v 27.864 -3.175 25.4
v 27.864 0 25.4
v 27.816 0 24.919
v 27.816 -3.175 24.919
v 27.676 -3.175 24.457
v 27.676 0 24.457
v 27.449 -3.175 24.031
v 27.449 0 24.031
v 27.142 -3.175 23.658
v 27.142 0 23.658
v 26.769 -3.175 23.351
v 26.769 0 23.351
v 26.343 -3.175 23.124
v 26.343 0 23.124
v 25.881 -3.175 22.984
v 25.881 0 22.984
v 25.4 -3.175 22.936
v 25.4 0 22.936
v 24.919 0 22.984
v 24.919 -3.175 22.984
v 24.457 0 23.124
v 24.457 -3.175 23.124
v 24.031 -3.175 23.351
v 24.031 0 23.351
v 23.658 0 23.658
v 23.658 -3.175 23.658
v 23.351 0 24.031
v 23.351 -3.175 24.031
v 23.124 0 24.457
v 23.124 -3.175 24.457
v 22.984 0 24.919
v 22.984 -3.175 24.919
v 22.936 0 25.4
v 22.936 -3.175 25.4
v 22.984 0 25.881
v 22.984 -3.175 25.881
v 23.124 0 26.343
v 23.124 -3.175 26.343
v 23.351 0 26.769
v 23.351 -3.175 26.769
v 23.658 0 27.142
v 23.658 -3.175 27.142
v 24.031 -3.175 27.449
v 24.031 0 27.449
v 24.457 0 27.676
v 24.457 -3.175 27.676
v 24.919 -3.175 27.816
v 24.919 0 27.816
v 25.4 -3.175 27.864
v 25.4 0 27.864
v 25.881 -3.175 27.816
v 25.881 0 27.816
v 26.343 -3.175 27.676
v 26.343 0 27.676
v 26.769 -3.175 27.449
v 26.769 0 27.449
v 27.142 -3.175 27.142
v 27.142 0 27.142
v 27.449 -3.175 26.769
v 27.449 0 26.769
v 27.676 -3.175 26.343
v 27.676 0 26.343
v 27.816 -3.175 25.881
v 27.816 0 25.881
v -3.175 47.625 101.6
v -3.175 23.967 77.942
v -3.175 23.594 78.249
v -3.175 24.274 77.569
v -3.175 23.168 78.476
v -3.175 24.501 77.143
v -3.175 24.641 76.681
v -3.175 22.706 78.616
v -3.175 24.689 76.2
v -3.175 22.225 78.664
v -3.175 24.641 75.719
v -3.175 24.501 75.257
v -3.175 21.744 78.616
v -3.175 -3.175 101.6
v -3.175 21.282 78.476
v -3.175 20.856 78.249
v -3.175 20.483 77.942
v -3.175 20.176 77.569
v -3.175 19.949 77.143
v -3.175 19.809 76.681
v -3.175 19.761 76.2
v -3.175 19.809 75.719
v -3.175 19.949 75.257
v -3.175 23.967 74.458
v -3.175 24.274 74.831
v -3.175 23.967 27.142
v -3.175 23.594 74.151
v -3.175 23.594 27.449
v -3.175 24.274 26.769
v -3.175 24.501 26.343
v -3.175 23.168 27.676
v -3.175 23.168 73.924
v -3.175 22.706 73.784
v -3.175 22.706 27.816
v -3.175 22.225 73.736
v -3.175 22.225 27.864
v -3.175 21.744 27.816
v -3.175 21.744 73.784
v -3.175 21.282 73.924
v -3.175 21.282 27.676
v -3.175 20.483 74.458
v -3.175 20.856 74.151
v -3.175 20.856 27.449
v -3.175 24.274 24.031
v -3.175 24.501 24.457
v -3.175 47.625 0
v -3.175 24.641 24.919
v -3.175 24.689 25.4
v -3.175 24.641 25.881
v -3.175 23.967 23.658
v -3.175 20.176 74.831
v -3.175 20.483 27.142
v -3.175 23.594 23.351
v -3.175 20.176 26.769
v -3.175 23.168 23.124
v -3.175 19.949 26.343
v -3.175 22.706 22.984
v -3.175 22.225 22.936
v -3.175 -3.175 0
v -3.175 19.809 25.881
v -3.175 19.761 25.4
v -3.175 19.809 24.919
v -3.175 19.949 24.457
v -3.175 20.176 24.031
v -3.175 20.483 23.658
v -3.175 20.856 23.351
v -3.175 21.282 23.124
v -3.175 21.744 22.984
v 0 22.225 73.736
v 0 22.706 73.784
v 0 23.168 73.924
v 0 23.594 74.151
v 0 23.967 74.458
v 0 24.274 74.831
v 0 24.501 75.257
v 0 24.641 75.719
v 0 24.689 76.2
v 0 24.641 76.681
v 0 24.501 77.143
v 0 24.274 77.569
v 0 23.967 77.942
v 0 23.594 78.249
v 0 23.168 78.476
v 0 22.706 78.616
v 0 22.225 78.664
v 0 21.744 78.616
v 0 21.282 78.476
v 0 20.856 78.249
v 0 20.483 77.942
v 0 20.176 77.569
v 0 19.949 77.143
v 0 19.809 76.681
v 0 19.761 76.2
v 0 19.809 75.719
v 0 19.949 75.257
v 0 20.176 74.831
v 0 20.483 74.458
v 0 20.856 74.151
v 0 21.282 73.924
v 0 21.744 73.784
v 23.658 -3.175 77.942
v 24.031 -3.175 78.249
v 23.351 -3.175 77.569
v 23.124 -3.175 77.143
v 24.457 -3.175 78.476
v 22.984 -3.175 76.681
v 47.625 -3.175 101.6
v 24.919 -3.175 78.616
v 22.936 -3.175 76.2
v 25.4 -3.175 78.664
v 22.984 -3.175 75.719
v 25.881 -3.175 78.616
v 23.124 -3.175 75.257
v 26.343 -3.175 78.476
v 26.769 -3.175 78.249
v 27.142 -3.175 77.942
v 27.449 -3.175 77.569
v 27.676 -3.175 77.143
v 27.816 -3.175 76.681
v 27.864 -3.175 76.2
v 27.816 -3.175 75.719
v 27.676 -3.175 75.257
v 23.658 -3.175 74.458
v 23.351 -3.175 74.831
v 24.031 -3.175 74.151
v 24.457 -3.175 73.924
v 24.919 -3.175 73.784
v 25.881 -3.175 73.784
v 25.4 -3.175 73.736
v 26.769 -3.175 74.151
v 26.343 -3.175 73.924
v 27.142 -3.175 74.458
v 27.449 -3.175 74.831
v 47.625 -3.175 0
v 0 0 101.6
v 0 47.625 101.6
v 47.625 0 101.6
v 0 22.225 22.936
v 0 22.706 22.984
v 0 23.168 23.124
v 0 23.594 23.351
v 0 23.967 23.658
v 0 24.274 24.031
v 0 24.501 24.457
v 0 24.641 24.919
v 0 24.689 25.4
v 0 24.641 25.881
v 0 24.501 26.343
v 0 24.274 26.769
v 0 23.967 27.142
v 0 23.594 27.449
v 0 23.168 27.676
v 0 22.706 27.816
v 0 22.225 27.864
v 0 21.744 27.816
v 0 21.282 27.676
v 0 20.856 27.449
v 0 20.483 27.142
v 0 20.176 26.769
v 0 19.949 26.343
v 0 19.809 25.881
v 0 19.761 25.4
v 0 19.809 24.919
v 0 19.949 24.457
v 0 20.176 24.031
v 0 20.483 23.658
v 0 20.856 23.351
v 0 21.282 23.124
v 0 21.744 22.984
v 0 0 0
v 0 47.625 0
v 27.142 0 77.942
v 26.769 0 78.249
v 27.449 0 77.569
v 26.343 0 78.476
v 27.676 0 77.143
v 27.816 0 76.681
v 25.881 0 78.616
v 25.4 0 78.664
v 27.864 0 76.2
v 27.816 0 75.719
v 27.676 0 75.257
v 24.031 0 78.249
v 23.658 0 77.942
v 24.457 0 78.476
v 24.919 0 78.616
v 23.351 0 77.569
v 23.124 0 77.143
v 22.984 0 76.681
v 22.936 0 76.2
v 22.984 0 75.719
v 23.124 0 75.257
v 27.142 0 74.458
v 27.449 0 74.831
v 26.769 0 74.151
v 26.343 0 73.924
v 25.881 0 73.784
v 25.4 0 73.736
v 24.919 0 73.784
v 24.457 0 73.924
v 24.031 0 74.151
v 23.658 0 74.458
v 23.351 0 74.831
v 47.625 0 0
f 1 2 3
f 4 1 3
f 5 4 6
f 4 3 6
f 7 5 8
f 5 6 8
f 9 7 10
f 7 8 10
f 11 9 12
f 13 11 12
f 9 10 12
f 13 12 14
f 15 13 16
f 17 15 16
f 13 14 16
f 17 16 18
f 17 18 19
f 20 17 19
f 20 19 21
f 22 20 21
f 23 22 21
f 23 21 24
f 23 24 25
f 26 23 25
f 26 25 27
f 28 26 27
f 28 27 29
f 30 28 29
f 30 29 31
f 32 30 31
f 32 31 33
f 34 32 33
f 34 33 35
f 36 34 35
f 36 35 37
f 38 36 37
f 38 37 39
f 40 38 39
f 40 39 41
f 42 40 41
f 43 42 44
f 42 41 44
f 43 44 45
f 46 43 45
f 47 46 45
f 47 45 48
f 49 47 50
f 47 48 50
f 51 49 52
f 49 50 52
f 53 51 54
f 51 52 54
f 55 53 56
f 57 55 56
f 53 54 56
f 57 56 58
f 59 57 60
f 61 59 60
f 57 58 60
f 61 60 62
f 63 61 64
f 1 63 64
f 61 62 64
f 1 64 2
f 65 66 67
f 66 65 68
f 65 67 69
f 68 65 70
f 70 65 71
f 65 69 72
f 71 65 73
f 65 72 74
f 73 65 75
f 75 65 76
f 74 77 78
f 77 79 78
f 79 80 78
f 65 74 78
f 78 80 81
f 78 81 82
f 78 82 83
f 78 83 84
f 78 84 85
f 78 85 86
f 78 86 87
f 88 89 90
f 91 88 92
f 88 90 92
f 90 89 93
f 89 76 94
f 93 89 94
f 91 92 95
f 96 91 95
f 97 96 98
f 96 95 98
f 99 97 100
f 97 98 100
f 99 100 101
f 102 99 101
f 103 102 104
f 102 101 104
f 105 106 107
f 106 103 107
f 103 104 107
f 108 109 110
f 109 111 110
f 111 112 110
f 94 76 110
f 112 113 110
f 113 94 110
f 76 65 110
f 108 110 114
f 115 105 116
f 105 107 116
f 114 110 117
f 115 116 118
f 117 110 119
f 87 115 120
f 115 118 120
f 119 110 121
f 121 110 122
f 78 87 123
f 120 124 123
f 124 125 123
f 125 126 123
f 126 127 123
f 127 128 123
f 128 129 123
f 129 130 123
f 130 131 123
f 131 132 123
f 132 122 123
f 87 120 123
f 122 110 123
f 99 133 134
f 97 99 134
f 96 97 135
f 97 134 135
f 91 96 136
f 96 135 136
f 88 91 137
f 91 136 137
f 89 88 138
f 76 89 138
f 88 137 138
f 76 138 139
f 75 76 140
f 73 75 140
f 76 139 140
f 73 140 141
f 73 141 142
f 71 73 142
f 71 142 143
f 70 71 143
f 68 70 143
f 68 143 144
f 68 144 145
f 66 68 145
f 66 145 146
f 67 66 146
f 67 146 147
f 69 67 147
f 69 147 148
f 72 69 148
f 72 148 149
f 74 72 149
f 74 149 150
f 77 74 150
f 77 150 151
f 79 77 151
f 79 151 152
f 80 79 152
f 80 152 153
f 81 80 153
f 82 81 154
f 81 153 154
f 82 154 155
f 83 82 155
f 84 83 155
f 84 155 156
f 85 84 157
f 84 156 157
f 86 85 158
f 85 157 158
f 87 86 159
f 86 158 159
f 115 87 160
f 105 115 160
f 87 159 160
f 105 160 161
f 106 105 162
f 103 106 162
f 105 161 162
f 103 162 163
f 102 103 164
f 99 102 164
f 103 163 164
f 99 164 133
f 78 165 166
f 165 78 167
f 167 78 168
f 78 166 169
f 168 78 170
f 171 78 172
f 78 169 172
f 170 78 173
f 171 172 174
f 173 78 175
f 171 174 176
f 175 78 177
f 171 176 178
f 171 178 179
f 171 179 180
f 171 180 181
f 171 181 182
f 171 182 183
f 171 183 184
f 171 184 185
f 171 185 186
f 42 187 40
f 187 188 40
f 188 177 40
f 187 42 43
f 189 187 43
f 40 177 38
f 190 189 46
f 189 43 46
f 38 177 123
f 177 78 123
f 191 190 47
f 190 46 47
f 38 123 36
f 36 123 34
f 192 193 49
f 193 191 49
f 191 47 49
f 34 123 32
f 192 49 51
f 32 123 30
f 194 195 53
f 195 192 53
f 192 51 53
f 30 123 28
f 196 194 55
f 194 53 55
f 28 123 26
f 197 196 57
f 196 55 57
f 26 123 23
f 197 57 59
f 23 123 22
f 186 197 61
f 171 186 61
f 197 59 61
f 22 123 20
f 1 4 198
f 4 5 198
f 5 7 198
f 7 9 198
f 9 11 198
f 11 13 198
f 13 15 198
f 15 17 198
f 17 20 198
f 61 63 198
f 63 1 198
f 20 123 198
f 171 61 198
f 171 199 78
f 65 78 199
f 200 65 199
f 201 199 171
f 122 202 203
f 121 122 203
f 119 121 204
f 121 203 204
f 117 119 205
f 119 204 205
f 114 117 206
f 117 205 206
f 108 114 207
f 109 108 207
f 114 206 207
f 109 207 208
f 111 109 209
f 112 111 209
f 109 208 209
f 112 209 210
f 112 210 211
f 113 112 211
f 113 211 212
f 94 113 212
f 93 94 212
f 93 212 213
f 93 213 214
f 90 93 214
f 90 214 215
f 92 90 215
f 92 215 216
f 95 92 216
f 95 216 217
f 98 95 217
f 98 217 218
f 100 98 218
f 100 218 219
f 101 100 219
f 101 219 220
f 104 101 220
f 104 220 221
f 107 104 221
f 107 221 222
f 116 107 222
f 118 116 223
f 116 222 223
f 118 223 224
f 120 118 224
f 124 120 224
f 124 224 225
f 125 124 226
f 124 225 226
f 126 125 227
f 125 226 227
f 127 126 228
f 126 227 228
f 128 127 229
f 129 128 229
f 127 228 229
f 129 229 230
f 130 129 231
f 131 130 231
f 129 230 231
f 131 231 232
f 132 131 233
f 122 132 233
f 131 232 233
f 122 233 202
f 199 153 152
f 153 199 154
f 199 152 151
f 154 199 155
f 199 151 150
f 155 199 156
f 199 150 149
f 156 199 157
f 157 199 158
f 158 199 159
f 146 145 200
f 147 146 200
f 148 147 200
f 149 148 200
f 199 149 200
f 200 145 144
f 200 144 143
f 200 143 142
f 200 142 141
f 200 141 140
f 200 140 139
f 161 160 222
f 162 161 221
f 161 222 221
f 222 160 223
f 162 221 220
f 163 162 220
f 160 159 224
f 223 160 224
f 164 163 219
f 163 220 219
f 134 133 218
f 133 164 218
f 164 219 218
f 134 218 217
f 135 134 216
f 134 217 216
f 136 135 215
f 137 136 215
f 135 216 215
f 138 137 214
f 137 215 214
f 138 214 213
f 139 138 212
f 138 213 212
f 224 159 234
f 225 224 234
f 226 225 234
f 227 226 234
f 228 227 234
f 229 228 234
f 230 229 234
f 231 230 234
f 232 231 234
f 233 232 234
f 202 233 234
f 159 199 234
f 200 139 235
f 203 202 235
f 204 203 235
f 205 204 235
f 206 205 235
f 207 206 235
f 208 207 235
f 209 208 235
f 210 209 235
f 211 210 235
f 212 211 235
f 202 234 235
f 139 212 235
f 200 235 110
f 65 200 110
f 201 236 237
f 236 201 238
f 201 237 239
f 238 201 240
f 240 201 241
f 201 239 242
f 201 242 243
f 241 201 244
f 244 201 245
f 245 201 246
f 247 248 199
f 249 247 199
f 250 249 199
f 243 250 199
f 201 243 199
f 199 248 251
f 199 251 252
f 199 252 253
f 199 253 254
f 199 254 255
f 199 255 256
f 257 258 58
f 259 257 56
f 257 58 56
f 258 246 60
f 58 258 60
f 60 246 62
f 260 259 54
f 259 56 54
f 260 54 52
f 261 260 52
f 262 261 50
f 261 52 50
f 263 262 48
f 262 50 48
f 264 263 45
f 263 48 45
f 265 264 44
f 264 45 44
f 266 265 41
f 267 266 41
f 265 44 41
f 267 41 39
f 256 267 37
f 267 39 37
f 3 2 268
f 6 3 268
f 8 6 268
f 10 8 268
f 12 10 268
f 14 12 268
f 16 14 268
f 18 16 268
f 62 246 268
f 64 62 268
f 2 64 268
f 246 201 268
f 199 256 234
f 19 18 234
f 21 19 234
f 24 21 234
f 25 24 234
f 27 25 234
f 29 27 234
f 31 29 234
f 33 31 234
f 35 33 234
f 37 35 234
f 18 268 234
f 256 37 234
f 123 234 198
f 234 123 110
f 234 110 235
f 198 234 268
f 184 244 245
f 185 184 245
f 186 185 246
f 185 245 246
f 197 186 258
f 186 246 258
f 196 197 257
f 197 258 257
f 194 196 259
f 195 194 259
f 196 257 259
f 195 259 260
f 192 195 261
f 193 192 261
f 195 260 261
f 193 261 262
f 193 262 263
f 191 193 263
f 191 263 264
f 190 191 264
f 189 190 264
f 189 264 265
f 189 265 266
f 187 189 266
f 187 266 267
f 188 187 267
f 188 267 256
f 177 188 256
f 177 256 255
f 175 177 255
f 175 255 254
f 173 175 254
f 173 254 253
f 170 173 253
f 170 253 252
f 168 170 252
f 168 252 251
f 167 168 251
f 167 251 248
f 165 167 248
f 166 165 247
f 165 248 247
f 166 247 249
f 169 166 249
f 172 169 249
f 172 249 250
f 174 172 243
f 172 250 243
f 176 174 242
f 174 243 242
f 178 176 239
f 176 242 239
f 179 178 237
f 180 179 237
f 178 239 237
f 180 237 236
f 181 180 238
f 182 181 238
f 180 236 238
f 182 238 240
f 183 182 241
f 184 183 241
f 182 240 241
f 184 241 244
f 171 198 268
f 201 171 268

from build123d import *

# Parameters (mm, degrees)
BOSS_EXTRUDE1_DEPTH = 101.6
SKETCH2_R           = 2.4638
CUT_EXTRUDE1_DEPTH  = 6.35
SKETCH3_R           = 2.4638
CUT_EXTRUDE2_DEPTH  = 6.35


with BuildPart() as part:
    # Sketch1 → Boss-Extrude1 (new body)
    with BuildSketch(Plane.XY):
        Polygon((0, 0), (0, 47.625), (-3.175, 47.625), (-3.175, -3.175), (47.625, -3.175), (47.625, 0), align=None)
    extrude(amount=BOSS_EXTRUDE1_DEPTH)

    # Sketch2 → Cut-Extrude1 (cut)
    with BuildSketch(Plane(origin=(0, 0, 0), x_dir=(1, 0, 0), z_dir=(0, 1, 0))):
        with Locations((25.4, -76.2)):
            Circle(SKETCH2_R)
        with Locations((25.4, -25.4)):
            Circle(SKETCH2_R)
    extrude(amount=-CUT_EXTRUDE1_DEPTH, mode=Mode.SUBTRACT)

    # Sketch3 → Cut-Extrude2 (cut)
    with BuildSketch(Plane(origin=(0, 0, 0), x_dir=(0, 0, -1), z_dir=(1, 0, 0))):
        with Locations((-25.4, 22.225)):
            Circle(SKETCH3_R)
        with Locations((-76.2, 22.225)):
            Circle(SKETCH3_R)
    extrude(amount=-CUT_EXTRUDE2_DEPTH, mode=Mode.SUBTRACT)


solid = part.part
